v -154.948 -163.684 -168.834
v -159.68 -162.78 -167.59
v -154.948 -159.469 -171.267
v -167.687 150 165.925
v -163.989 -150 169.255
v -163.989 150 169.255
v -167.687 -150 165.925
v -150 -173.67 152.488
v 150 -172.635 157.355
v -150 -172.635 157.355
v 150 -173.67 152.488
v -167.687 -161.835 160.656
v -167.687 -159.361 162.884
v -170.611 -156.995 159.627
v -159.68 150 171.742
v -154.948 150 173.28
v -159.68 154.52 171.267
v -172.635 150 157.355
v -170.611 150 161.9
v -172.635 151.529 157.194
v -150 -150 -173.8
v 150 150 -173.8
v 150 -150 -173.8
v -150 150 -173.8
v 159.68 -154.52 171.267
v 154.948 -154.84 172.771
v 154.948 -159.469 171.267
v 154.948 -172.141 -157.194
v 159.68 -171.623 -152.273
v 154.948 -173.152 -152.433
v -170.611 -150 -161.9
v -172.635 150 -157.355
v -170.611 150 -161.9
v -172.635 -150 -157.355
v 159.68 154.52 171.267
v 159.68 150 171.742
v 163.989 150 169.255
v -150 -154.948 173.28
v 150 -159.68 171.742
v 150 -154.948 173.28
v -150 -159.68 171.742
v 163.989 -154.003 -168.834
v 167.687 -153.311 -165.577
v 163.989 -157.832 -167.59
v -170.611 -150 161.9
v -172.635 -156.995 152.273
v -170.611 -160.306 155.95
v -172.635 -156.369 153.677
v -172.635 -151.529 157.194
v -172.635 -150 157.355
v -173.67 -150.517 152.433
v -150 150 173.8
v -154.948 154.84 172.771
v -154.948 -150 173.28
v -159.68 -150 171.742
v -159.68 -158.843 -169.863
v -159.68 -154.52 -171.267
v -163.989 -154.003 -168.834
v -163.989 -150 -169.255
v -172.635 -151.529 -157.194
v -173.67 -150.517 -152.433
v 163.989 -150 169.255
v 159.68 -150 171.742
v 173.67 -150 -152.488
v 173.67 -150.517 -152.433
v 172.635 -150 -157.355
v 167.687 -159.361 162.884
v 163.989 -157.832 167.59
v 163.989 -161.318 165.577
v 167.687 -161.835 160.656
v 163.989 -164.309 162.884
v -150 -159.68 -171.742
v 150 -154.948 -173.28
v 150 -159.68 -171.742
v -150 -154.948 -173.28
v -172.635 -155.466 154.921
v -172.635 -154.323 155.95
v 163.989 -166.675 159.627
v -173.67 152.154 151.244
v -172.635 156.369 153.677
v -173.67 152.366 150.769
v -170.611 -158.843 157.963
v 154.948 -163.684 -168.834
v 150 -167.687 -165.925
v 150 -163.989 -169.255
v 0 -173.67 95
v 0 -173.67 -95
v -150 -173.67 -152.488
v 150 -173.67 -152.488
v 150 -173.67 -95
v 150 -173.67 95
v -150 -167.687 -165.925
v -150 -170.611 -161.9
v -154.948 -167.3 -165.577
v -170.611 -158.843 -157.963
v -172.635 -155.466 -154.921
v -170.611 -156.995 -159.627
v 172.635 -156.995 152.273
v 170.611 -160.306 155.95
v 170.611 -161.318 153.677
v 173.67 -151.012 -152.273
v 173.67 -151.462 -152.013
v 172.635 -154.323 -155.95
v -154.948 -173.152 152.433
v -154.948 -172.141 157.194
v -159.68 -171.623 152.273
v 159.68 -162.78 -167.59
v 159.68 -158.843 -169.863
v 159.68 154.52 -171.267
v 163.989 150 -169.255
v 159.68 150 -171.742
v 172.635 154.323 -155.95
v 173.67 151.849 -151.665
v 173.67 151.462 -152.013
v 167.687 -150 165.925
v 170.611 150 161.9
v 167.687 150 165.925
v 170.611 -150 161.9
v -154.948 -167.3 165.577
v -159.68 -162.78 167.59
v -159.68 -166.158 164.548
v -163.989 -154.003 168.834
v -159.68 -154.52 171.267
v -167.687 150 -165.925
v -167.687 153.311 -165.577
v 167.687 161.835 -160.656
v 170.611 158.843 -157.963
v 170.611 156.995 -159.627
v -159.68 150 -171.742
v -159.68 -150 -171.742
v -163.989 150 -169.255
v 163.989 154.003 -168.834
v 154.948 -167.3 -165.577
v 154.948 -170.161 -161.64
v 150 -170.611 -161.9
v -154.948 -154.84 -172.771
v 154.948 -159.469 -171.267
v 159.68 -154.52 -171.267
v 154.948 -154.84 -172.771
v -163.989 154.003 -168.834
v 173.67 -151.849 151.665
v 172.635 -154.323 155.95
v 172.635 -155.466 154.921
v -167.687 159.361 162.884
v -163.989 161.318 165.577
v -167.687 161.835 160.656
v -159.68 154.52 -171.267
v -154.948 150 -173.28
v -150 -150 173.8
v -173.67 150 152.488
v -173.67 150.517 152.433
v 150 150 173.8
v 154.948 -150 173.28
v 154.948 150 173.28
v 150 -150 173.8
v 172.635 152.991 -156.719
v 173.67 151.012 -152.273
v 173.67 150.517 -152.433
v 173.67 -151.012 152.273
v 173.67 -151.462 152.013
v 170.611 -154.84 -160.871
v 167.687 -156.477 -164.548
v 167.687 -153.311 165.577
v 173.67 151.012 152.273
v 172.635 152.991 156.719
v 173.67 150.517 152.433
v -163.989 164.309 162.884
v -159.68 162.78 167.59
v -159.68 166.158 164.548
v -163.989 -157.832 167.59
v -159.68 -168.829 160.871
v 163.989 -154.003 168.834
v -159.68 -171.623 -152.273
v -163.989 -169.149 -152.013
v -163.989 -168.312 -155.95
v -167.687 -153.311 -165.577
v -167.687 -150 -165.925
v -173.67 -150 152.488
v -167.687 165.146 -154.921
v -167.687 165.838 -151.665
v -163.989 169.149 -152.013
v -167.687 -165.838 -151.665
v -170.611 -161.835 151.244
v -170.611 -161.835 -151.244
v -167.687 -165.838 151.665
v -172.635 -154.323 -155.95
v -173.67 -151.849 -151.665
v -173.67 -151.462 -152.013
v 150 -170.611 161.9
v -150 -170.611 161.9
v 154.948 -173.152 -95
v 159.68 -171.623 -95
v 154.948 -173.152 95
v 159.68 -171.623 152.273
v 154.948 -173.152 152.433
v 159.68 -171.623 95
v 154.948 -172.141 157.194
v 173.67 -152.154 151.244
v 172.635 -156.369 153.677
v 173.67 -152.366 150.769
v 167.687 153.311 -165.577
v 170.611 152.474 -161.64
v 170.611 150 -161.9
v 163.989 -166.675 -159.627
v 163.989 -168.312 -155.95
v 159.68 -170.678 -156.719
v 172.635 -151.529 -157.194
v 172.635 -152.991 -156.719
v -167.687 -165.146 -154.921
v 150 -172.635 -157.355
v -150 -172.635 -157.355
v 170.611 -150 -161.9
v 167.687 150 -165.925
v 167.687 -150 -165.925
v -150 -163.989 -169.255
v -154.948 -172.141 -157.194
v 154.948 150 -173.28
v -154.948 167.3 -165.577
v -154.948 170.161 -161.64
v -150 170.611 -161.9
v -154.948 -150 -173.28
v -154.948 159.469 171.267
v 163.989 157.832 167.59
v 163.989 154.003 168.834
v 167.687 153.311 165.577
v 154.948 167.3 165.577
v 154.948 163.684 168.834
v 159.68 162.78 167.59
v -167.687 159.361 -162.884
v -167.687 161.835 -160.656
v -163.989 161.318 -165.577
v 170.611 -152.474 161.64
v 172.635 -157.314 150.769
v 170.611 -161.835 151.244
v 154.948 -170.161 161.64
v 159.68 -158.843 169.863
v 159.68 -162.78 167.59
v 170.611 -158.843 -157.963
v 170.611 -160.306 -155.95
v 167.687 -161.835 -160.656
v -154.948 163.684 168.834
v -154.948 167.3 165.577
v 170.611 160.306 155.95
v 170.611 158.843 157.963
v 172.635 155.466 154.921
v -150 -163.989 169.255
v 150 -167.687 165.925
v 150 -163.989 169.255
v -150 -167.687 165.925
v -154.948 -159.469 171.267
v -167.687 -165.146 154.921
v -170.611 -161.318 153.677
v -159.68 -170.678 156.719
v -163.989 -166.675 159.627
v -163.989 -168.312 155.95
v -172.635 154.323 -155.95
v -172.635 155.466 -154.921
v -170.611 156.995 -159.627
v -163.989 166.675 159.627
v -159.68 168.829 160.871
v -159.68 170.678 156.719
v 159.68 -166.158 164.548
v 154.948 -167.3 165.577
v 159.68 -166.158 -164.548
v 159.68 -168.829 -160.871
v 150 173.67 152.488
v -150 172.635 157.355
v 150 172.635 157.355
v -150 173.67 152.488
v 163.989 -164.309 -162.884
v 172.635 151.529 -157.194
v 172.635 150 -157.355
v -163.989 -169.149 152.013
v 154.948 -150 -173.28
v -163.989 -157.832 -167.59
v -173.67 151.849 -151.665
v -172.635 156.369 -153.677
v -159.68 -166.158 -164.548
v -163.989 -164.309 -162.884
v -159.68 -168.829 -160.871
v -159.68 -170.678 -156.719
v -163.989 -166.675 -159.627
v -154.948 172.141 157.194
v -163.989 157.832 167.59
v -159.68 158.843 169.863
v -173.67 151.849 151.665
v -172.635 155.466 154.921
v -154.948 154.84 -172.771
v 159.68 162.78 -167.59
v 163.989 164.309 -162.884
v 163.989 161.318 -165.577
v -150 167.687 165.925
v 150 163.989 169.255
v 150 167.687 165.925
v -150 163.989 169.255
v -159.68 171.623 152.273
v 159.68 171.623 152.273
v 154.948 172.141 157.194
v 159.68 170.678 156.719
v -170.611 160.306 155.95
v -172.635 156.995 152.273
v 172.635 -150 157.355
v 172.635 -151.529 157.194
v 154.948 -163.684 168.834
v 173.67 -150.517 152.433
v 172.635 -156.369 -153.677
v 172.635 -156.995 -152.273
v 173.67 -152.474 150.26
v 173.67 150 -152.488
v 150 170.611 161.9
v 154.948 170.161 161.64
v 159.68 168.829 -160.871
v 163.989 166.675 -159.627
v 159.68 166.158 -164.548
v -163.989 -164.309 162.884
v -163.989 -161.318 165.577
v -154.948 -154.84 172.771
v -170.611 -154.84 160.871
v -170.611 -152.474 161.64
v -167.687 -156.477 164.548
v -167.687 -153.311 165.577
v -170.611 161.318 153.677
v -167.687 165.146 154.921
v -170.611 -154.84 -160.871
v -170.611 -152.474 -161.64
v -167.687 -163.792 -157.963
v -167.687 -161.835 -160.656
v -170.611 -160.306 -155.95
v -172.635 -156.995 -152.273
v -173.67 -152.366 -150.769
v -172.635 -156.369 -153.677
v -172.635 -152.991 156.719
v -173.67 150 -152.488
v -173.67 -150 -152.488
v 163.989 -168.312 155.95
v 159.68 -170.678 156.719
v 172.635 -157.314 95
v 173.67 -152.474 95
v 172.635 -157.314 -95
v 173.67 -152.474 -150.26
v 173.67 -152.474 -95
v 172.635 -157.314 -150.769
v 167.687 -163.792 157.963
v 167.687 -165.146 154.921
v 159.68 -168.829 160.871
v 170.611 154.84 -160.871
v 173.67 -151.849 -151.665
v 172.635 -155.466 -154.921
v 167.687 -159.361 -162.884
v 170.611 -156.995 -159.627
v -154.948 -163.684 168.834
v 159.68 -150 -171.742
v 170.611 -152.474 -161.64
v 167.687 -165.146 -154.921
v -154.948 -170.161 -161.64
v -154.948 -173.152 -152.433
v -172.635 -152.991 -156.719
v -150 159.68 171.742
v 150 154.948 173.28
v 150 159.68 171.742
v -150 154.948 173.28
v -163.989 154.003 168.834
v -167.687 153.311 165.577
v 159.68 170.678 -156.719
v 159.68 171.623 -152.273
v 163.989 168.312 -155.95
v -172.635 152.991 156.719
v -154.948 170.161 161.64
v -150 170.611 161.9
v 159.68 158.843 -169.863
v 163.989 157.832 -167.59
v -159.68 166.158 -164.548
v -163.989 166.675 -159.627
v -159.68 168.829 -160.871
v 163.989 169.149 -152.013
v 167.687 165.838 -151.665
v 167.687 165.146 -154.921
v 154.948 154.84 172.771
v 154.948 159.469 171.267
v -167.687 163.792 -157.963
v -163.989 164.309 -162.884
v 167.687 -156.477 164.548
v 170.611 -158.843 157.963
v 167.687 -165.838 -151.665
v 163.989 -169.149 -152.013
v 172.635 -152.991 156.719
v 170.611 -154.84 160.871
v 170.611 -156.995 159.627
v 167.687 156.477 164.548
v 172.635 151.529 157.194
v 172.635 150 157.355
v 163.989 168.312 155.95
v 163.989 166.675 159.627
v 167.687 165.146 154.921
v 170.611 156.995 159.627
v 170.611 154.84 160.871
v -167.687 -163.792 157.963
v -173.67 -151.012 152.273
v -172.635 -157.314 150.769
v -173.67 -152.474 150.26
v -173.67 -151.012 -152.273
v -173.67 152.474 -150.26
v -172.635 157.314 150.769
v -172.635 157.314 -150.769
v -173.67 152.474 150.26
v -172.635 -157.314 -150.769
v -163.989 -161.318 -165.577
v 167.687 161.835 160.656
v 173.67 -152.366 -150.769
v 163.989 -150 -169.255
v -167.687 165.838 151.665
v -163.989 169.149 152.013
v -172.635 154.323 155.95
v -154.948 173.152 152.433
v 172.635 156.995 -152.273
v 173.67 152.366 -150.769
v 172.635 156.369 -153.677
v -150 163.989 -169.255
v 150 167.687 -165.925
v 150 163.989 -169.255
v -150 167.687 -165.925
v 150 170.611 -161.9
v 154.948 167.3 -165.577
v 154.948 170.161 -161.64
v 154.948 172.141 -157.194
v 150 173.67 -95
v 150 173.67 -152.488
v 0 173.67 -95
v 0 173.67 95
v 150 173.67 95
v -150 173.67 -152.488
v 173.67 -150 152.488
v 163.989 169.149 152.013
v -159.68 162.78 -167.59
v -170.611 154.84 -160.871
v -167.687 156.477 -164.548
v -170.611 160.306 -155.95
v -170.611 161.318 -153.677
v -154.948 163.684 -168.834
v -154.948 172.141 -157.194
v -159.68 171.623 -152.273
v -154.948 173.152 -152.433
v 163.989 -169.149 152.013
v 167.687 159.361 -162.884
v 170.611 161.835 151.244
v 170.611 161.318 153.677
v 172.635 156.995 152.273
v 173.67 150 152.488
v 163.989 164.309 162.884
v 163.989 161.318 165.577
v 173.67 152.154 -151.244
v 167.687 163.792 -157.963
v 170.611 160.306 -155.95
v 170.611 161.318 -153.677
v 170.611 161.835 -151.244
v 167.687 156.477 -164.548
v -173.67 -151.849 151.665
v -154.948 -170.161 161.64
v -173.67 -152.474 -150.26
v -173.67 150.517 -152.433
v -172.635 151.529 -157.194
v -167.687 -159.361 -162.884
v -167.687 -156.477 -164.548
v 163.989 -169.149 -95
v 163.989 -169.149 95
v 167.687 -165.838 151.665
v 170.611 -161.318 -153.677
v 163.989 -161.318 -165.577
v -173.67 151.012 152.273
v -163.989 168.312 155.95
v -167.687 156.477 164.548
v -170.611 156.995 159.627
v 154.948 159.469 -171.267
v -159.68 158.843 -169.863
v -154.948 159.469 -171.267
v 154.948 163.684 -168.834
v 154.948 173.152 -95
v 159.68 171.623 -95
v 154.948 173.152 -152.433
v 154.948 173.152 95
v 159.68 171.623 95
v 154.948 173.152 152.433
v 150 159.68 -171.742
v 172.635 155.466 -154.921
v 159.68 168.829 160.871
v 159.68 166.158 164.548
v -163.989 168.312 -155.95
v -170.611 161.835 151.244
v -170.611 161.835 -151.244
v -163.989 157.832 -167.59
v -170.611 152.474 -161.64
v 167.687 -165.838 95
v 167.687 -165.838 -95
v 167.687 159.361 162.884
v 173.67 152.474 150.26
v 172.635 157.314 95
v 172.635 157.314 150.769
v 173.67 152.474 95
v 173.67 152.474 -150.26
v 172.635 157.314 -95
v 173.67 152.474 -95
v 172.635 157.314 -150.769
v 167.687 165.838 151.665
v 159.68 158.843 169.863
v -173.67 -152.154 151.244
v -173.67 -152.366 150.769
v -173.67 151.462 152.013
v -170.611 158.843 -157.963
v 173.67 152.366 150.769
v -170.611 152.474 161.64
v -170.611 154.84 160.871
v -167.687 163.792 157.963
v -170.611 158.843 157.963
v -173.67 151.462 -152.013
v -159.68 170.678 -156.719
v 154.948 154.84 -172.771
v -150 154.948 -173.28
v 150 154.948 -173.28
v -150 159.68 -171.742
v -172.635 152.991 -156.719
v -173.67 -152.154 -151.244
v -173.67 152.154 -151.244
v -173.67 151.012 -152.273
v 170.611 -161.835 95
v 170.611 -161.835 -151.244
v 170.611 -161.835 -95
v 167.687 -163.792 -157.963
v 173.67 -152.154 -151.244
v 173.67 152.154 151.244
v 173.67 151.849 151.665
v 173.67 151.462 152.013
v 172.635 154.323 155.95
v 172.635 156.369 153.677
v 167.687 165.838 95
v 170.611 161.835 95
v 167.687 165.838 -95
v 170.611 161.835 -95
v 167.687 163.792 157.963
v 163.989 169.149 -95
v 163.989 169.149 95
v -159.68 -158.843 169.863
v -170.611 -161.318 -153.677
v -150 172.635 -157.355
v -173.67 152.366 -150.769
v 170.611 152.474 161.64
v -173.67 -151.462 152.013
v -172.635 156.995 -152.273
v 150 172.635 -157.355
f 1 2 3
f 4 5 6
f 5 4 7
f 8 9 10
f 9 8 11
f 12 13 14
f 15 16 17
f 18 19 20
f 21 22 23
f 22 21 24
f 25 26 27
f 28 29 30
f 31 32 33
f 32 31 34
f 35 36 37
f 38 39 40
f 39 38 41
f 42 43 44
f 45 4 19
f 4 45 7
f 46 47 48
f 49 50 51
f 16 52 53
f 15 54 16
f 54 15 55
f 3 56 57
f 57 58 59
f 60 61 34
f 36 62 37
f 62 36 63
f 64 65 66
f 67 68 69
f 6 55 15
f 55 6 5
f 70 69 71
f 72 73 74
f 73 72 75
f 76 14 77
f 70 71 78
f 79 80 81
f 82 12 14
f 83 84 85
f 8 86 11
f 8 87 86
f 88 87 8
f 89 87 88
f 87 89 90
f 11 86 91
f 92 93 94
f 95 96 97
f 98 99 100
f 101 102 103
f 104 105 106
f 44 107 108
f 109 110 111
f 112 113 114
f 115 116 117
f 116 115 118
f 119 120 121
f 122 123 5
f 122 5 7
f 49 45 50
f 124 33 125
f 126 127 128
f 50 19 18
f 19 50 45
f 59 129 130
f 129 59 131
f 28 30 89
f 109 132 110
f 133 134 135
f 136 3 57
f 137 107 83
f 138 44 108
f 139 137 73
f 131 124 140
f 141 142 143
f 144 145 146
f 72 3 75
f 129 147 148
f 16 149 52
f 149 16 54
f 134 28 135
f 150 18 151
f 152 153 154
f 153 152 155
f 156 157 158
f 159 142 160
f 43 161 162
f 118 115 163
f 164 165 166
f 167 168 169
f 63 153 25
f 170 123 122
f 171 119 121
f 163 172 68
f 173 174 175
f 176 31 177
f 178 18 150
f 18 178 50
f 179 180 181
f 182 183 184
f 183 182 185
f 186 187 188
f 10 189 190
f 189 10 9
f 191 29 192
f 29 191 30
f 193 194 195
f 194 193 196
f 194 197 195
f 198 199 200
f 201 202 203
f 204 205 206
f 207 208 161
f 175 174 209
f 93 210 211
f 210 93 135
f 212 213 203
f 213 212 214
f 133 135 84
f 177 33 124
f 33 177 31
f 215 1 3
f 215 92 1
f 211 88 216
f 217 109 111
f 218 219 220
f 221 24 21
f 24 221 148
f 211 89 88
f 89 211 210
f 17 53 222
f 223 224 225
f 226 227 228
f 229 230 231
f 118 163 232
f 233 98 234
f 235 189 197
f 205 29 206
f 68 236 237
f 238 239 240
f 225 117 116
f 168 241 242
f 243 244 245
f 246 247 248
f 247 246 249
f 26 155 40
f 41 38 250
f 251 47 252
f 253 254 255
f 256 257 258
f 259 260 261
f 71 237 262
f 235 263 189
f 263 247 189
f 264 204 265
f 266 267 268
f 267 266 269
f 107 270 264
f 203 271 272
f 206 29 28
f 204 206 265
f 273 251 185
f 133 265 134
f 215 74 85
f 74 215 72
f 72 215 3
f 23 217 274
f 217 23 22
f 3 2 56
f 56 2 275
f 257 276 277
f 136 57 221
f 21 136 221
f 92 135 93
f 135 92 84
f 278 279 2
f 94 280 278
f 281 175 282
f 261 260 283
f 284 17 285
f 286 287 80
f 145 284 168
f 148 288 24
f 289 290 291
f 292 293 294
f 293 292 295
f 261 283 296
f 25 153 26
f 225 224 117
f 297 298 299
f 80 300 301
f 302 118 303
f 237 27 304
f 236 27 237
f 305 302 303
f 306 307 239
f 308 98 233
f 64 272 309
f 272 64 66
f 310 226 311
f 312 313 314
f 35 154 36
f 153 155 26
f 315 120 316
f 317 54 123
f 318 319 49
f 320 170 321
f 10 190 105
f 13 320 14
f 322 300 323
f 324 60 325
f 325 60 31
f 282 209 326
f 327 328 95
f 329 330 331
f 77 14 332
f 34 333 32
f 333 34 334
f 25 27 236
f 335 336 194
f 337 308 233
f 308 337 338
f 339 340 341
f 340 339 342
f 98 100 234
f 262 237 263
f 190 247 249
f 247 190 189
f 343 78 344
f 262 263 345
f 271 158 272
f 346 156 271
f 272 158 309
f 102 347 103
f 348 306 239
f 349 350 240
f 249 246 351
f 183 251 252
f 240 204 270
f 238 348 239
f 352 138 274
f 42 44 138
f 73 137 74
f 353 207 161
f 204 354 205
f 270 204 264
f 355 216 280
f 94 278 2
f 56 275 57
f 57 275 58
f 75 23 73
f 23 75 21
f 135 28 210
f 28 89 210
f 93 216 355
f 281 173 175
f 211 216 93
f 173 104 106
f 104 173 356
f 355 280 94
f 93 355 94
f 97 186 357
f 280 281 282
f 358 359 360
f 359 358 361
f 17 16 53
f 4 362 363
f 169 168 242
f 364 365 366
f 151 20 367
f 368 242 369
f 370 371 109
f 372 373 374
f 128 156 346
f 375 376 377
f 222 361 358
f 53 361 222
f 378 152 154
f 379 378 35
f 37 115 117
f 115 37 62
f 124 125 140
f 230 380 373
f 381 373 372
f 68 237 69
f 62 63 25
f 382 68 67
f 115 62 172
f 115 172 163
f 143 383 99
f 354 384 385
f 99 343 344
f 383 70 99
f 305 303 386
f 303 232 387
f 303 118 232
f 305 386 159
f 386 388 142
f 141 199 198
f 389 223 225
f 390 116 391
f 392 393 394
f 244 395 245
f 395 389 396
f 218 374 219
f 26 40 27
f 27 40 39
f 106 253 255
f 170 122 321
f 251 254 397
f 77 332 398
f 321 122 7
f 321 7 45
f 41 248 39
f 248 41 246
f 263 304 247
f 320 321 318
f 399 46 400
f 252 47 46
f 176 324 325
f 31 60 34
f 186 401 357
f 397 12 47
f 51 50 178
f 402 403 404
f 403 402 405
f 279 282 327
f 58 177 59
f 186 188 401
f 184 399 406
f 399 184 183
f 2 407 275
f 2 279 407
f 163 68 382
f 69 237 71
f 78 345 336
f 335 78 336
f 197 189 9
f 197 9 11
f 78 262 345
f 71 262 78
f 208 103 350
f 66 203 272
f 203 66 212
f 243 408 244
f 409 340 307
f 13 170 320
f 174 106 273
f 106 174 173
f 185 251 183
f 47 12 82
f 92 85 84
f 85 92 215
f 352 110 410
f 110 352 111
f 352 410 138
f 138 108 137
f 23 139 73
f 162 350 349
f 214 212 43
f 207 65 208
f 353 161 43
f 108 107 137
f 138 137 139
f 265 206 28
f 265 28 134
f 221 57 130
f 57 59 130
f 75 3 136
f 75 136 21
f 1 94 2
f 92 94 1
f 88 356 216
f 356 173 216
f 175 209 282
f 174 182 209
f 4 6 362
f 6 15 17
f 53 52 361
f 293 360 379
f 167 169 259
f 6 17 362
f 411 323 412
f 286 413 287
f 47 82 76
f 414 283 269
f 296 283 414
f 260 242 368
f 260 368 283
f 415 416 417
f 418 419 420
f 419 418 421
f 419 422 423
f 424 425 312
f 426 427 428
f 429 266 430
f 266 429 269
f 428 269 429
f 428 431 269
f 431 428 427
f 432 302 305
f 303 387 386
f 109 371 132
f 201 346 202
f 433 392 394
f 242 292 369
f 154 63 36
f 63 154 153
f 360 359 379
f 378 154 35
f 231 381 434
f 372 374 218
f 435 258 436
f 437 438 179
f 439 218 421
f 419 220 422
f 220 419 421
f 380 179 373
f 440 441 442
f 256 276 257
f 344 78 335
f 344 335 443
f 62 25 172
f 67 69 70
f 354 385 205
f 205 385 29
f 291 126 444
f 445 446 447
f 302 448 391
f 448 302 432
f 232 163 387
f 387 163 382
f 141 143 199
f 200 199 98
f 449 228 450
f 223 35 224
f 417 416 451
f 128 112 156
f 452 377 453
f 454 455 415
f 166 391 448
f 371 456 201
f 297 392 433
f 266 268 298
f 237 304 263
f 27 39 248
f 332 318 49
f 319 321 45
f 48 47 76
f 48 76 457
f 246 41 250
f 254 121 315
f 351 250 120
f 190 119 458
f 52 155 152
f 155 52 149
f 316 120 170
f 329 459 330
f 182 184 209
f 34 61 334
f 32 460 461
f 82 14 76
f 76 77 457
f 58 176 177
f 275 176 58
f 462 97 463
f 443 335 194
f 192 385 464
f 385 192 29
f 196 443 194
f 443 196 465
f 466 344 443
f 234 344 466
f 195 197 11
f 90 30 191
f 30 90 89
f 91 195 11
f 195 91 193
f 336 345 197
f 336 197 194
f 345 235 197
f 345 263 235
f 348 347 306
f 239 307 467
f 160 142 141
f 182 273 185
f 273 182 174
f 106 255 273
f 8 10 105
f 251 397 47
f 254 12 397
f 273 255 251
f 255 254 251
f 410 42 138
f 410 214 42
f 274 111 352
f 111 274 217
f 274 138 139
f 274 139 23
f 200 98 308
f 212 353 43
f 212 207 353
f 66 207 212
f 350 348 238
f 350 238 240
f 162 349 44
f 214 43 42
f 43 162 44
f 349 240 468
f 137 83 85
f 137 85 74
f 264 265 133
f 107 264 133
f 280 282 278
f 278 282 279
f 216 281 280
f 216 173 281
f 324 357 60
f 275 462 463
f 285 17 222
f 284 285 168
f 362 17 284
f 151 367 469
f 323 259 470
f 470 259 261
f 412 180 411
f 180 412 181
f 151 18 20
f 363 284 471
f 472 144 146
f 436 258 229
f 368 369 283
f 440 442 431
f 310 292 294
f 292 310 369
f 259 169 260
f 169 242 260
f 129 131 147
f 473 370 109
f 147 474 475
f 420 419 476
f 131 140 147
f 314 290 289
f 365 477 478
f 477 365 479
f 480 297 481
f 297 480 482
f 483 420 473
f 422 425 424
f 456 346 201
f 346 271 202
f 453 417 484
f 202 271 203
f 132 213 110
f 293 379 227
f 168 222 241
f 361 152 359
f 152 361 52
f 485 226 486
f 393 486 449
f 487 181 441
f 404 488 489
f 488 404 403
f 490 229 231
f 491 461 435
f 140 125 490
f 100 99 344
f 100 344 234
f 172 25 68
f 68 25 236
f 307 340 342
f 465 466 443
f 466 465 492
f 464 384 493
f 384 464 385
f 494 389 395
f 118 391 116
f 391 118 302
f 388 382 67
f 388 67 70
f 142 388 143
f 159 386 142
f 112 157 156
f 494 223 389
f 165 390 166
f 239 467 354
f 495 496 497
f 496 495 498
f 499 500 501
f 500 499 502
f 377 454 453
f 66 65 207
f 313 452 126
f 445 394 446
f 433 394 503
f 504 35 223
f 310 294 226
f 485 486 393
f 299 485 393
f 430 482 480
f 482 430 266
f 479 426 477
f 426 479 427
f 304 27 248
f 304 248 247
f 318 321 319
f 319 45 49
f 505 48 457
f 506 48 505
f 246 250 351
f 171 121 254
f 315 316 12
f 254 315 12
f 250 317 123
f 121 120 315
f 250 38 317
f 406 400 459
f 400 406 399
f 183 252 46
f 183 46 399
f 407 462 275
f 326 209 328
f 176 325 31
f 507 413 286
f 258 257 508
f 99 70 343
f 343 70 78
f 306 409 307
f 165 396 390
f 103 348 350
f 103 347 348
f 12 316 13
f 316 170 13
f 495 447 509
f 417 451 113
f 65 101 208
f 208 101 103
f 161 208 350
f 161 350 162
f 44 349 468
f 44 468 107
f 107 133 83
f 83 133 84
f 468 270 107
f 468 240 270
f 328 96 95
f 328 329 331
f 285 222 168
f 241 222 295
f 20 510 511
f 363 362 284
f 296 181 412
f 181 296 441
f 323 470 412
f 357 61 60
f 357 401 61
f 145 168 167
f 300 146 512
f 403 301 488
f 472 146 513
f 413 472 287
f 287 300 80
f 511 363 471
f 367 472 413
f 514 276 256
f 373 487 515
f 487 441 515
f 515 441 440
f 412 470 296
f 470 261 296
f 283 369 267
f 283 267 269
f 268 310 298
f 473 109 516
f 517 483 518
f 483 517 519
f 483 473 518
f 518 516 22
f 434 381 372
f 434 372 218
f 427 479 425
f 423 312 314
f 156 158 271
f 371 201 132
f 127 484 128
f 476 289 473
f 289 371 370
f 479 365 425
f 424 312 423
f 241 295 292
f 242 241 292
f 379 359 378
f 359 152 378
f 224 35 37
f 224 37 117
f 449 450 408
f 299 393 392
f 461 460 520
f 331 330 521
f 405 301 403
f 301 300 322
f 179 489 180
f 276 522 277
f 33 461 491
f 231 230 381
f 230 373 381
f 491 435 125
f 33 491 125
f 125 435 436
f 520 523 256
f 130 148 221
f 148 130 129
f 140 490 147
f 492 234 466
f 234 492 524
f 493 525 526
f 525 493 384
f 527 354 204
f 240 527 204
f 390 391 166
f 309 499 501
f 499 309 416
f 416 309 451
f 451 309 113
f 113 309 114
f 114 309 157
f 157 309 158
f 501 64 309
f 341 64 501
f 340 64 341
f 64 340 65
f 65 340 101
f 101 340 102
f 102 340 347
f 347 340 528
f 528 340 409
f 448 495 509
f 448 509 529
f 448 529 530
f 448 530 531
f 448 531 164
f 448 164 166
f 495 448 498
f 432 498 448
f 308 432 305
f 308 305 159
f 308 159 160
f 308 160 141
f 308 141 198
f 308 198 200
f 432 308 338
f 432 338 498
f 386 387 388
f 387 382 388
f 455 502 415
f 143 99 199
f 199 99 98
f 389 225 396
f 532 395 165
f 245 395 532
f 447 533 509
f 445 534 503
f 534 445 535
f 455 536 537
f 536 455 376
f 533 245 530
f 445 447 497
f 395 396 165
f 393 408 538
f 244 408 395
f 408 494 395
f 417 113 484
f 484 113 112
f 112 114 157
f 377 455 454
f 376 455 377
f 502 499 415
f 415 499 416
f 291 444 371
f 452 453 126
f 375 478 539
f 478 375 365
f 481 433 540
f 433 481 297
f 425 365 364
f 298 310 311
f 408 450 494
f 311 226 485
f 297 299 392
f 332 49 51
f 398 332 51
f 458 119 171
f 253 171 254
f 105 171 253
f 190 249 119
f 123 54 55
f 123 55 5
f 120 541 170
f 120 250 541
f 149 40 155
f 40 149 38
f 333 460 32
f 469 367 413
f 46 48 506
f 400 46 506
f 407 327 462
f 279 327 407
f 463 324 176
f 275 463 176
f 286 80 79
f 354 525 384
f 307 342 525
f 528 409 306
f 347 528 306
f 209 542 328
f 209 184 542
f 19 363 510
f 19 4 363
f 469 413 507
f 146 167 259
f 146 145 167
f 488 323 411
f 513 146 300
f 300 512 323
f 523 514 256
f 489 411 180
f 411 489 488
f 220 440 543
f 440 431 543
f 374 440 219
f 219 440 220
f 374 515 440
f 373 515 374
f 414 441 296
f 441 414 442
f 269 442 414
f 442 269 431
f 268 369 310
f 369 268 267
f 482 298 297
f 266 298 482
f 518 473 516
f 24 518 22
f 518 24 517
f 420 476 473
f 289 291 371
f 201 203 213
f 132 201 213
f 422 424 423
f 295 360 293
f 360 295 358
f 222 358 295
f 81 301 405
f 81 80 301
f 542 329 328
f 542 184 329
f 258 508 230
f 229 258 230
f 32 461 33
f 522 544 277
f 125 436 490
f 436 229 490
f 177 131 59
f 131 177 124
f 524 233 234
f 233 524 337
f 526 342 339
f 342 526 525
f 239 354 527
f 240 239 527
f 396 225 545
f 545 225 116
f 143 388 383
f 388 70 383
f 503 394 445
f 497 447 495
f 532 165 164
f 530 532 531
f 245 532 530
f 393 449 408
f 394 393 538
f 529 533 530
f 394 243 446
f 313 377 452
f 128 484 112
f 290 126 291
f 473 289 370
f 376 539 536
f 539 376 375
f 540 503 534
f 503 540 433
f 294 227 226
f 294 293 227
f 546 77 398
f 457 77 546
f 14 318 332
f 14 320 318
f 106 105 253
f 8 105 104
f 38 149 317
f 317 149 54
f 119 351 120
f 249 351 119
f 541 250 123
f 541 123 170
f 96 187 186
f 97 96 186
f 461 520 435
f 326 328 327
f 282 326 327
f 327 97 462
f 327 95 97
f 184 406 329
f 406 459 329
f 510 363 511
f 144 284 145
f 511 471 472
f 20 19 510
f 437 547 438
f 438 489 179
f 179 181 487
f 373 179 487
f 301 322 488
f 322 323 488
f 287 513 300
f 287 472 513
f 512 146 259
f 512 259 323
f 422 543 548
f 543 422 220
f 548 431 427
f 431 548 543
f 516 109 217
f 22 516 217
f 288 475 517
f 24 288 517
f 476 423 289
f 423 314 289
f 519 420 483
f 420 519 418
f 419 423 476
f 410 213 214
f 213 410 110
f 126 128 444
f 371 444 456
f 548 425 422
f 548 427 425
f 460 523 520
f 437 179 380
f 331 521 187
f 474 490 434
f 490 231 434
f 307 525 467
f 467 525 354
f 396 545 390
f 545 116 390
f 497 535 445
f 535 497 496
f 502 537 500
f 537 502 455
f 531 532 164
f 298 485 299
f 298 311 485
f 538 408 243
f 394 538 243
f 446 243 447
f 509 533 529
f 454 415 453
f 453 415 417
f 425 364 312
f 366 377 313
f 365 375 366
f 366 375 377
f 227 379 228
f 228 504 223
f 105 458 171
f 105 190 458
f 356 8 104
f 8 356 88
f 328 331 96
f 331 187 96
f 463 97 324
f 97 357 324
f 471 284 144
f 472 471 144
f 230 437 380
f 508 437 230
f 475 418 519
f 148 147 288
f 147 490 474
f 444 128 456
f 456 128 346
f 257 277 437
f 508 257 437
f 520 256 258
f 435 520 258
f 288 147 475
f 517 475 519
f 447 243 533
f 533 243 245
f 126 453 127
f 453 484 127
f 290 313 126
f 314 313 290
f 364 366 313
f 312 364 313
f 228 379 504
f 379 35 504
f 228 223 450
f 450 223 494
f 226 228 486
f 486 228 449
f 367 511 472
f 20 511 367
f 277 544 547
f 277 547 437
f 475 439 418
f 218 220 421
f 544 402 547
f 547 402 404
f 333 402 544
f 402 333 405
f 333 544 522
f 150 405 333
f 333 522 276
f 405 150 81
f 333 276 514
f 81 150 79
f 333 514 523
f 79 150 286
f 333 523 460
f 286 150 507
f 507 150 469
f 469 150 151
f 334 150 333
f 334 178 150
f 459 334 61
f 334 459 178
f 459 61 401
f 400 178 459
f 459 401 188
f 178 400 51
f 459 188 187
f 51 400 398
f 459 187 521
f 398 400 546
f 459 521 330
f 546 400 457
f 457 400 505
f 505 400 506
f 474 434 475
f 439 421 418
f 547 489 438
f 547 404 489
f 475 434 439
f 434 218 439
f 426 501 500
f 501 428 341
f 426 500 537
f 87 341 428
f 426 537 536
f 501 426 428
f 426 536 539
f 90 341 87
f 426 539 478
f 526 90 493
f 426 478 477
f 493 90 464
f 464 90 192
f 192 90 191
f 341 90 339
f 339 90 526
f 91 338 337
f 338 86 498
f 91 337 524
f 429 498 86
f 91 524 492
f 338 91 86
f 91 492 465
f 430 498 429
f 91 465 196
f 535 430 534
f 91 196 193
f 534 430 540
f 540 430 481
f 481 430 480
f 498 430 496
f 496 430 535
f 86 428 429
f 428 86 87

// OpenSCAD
module rounded_square(width, length, radius){
    diameter = radius * 2;
    
    minkowski() {
        square([width - diameter, length - diameter], center=true);
        circle(radius);
    
    }
}

module rounded_cube(width, length, height, radius){
    
    hull(){
        for(x = [-width/2, width/2]) {
            for(y = [-length/2, length/2]) {
                for(z = [-height/2, height/2]) {
                    translate([x, y, z])
                    sphere(radius);
                }
            }
        }
        
    }
}


module basic_outline(){
    size = 300;
    prep_area_depth = 160;
    control_area_height = 110;
    radius = 23.8;
    
    rotate([0, 90, 0]){
        difference(){
            rounded_cube(size, size, size, radius);
            
            linear_extrude(prep_area_depth + 100)
            rounded_square(size - control_area_height, 1000, radius);
        }
    }
}

basic_outline();
